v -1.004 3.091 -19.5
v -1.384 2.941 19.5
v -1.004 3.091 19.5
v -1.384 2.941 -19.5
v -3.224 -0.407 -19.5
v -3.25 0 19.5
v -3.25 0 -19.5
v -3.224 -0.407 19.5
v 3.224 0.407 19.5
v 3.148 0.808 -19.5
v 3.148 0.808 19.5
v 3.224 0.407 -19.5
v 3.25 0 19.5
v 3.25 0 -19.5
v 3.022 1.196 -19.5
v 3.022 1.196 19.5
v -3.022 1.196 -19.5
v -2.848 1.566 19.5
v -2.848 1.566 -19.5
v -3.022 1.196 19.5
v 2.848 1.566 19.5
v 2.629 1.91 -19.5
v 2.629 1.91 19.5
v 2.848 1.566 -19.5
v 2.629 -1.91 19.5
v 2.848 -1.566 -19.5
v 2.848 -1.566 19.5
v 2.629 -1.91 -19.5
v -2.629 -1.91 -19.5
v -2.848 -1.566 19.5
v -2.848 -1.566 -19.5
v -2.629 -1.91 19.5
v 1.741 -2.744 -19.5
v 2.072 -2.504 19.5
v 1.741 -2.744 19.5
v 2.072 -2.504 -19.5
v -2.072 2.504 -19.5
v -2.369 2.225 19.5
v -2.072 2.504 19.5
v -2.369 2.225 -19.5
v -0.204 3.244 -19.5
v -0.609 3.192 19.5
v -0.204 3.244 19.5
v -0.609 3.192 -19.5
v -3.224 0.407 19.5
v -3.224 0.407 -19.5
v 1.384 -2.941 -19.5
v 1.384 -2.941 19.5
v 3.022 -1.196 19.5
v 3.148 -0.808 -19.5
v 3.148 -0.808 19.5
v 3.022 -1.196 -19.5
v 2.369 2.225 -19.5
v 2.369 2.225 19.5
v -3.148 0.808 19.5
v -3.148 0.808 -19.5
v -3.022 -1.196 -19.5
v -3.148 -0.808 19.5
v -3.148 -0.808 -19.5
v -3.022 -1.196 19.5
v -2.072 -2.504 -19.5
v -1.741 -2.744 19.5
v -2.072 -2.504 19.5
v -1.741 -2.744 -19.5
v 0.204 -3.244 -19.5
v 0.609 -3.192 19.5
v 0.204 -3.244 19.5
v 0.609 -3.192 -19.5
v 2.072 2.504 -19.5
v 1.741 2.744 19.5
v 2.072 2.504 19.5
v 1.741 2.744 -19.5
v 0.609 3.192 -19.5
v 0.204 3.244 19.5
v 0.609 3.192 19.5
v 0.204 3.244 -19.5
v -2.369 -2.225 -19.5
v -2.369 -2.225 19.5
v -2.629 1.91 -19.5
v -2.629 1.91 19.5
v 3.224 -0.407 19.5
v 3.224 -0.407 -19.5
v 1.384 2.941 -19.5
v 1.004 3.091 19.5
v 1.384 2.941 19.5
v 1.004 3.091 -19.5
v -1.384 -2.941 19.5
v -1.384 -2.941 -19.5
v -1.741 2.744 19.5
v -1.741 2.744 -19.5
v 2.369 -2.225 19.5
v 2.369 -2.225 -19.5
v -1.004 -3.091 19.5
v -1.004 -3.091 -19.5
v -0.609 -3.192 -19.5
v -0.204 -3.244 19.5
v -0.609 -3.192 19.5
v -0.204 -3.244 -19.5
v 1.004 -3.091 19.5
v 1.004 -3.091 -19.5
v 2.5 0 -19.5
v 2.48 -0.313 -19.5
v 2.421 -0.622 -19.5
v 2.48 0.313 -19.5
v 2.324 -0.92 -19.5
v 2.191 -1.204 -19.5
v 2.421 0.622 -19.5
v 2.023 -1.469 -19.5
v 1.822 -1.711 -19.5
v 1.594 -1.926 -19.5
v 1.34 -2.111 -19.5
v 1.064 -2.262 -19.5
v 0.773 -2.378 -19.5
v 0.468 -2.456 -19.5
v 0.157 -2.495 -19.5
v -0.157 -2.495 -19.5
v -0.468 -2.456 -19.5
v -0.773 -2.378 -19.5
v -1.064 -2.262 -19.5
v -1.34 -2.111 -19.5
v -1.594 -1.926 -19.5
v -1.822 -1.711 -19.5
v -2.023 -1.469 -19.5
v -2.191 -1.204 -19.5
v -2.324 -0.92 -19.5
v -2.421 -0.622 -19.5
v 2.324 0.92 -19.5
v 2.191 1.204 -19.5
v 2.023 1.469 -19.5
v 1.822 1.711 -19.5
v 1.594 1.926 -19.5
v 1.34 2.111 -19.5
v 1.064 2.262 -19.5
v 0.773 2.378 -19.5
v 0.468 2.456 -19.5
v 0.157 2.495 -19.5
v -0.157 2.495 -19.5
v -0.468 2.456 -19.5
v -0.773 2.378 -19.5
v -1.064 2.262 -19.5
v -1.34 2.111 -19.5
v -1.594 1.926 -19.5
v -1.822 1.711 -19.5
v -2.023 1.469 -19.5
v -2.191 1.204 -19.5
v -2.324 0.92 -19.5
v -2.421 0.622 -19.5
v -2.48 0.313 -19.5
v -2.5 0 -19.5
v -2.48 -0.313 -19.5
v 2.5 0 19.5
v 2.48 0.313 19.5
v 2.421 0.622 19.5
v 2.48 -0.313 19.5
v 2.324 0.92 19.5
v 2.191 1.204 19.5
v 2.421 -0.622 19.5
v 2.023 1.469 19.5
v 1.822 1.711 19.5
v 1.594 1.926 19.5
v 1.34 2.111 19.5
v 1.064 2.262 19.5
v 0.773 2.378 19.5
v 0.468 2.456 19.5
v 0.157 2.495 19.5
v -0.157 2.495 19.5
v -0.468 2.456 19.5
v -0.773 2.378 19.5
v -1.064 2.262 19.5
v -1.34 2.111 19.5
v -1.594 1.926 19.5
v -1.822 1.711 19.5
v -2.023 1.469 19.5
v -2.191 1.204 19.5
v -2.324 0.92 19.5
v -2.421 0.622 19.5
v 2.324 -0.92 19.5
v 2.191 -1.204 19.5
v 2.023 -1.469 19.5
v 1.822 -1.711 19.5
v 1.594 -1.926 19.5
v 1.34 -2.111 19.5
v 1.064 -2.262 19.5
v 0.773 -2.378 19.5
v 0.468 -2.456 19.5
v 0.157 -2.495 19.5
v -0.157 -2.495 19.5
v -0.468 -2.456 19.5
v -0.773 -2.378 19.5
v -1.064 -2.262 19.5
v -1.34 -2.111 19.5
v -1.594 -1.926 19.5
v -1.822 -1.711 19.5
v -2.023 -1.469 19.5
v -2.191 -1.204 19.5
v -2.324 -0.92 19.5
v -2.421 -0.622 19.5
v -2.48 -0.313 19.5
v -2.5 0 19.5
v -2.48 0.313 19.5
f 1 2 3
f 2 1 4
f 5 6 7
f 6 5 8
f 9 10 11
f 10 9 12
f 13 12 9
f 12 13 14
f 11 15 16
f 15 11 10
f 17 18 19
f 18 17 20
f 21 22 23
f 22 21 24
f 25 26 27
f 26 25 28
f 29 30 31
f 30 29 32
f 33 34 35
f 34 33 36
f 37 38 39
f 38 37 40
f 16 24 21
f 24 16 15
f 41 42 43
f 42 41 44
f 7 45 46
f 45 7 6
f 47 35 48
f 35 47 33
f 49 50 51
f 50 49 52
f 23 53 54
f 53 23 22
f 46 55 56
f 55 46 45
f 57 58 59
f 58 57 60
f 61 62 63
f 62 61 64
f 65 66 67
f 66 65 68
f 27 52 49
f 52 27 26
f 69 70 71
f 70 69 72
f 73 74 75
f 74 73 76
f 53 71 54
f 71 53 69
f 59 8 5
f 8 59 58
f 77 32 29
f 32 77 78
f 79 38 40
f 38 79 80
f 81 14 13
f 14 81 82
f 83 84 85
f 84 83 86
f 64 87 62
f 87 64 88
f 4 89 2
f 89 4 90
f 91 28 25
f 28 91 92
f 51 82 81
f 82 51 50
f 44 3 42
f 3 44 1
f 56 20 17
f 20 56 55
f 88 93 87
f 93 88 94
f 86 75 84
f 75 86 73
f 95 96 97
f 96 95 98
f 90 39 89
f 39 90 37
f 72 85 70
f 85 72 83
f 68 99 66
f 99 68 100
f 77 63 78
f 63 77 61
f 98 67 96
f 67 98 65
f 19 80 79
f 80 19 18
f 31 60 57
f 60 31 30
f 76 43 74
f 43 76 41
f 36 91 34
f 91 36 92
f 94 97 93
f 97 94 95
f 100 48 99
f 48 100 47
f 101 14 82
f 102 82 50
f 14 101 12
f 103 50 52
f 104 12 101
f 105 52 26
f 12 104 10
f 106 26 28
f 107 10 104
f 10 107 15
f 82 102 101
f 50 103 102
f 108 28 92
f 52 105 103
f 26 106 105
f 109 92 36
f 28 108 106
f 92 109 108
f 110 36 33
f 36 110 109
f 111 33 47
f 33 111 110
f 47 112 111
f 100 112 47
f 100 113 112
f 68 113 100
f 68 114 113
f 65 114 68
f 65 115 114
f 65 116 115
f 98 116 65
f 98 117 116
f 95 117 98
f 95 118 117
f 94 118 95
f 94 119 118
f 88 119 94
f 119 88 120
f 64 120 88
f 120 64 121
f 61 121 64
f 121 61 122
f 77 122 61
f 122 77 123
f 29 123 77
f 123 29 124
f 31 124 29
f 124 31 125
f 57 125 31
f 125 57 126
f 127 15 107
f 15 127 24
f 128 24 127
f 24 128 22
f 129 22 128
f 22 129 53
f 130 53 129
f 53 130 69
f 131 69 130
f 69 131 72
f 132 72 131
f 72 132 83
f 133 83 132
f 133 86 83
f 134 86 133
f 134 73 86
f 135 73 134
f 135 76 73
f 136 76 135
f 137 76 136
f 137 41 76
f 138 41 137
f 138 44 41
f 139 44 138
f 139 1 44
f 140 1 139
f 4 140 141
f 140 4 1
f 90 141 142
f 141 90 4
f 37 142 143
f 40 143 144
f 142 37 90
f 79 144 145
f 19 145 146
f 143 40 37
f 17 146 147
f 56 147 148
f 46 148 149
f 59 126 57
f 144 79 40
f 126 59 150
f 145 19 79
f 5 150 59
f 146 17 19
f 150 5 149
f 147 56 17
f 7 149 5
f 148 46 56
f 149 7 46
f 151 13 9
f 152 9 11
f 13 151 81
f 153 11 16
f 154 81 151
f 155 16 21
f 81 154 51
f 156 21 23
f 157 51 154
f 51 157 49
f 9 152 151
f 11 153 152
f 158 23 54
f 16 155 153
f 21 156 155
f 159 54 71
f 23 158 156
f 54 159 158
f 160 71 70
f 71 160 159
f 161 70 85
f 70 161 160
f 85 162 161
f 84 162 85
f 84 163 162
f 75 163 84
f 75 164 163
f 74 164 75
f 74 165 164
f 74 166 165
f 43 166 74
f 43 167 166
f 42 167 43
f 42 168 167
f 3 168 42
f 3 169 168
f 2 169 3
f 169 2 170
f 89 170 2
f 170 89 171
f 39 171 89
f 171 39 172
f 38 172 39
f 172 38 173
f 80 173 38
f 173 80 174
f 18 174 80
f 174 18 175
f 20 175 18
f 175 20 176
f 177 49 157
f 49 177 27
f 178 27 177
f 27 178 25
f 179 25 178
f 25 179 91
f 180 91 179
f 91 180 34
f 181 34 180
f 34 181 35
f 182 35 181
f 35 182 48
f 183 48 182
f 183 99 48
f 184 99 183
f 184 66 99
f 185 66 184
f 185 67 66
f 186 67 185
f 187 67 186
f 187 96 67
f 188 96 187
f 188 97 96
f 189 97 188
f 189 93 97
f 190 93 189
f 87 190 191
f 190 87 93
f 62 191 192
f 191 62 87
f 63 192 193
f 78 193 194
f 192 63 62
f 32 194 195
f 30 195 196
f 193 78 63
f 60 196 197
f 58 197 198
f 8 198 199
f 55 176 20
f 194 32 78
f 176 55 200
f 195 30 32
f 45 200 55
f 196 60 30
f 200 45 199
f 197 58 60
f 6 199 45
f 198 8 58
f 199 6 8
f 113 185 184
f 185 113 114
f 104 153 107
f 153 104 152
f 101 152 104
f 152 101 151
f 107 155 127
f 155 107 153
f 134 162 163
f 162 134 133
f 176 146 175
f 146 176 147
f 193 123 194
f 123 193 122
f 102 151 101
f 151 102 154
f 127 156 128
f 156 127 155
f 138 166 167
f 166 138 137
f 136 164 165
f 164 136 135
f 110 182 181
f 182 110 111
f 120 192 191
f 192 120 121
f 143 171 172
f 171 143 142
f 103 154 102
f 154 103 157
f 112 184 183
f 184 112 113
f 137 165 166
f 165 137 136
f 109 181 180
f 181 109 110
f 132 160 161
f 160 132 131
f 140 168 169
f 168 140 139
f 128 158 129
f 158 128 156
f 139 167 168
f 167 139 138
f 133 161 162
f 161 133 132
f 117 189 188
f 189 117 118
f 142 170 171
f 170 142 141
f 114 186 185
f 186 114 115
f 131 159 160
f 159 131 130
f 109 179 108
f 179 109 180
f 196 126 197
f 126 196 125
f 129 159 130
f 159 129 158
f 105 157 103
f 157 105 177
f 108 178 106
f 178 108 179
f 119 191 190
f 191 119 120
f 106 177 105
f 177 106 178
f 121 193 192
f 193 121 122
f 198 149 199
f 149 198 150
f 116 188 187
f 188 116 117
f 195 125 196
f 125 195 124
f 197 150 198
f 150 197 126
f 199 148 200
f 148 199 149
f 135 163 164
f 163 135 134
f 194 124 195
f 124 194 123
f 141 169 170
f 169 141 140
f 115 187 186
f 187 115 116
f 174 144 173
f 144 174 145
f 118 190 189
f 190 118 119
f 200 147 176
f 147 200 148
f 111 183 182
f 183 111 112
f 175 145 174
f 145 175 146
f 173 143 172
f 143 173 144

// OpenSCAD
$fn = 50;


difference() {
	union() {
		translate(v = [0, 0, -19.5000000000]) {
			cylinder(h = 39, r = 3.2500000000);
		}
	}
	union() {
		translate(v = [0, 0, -100.0000000000]) {
			cylinder(h = 200, r = 2.5000000000);
		}
	}
}
